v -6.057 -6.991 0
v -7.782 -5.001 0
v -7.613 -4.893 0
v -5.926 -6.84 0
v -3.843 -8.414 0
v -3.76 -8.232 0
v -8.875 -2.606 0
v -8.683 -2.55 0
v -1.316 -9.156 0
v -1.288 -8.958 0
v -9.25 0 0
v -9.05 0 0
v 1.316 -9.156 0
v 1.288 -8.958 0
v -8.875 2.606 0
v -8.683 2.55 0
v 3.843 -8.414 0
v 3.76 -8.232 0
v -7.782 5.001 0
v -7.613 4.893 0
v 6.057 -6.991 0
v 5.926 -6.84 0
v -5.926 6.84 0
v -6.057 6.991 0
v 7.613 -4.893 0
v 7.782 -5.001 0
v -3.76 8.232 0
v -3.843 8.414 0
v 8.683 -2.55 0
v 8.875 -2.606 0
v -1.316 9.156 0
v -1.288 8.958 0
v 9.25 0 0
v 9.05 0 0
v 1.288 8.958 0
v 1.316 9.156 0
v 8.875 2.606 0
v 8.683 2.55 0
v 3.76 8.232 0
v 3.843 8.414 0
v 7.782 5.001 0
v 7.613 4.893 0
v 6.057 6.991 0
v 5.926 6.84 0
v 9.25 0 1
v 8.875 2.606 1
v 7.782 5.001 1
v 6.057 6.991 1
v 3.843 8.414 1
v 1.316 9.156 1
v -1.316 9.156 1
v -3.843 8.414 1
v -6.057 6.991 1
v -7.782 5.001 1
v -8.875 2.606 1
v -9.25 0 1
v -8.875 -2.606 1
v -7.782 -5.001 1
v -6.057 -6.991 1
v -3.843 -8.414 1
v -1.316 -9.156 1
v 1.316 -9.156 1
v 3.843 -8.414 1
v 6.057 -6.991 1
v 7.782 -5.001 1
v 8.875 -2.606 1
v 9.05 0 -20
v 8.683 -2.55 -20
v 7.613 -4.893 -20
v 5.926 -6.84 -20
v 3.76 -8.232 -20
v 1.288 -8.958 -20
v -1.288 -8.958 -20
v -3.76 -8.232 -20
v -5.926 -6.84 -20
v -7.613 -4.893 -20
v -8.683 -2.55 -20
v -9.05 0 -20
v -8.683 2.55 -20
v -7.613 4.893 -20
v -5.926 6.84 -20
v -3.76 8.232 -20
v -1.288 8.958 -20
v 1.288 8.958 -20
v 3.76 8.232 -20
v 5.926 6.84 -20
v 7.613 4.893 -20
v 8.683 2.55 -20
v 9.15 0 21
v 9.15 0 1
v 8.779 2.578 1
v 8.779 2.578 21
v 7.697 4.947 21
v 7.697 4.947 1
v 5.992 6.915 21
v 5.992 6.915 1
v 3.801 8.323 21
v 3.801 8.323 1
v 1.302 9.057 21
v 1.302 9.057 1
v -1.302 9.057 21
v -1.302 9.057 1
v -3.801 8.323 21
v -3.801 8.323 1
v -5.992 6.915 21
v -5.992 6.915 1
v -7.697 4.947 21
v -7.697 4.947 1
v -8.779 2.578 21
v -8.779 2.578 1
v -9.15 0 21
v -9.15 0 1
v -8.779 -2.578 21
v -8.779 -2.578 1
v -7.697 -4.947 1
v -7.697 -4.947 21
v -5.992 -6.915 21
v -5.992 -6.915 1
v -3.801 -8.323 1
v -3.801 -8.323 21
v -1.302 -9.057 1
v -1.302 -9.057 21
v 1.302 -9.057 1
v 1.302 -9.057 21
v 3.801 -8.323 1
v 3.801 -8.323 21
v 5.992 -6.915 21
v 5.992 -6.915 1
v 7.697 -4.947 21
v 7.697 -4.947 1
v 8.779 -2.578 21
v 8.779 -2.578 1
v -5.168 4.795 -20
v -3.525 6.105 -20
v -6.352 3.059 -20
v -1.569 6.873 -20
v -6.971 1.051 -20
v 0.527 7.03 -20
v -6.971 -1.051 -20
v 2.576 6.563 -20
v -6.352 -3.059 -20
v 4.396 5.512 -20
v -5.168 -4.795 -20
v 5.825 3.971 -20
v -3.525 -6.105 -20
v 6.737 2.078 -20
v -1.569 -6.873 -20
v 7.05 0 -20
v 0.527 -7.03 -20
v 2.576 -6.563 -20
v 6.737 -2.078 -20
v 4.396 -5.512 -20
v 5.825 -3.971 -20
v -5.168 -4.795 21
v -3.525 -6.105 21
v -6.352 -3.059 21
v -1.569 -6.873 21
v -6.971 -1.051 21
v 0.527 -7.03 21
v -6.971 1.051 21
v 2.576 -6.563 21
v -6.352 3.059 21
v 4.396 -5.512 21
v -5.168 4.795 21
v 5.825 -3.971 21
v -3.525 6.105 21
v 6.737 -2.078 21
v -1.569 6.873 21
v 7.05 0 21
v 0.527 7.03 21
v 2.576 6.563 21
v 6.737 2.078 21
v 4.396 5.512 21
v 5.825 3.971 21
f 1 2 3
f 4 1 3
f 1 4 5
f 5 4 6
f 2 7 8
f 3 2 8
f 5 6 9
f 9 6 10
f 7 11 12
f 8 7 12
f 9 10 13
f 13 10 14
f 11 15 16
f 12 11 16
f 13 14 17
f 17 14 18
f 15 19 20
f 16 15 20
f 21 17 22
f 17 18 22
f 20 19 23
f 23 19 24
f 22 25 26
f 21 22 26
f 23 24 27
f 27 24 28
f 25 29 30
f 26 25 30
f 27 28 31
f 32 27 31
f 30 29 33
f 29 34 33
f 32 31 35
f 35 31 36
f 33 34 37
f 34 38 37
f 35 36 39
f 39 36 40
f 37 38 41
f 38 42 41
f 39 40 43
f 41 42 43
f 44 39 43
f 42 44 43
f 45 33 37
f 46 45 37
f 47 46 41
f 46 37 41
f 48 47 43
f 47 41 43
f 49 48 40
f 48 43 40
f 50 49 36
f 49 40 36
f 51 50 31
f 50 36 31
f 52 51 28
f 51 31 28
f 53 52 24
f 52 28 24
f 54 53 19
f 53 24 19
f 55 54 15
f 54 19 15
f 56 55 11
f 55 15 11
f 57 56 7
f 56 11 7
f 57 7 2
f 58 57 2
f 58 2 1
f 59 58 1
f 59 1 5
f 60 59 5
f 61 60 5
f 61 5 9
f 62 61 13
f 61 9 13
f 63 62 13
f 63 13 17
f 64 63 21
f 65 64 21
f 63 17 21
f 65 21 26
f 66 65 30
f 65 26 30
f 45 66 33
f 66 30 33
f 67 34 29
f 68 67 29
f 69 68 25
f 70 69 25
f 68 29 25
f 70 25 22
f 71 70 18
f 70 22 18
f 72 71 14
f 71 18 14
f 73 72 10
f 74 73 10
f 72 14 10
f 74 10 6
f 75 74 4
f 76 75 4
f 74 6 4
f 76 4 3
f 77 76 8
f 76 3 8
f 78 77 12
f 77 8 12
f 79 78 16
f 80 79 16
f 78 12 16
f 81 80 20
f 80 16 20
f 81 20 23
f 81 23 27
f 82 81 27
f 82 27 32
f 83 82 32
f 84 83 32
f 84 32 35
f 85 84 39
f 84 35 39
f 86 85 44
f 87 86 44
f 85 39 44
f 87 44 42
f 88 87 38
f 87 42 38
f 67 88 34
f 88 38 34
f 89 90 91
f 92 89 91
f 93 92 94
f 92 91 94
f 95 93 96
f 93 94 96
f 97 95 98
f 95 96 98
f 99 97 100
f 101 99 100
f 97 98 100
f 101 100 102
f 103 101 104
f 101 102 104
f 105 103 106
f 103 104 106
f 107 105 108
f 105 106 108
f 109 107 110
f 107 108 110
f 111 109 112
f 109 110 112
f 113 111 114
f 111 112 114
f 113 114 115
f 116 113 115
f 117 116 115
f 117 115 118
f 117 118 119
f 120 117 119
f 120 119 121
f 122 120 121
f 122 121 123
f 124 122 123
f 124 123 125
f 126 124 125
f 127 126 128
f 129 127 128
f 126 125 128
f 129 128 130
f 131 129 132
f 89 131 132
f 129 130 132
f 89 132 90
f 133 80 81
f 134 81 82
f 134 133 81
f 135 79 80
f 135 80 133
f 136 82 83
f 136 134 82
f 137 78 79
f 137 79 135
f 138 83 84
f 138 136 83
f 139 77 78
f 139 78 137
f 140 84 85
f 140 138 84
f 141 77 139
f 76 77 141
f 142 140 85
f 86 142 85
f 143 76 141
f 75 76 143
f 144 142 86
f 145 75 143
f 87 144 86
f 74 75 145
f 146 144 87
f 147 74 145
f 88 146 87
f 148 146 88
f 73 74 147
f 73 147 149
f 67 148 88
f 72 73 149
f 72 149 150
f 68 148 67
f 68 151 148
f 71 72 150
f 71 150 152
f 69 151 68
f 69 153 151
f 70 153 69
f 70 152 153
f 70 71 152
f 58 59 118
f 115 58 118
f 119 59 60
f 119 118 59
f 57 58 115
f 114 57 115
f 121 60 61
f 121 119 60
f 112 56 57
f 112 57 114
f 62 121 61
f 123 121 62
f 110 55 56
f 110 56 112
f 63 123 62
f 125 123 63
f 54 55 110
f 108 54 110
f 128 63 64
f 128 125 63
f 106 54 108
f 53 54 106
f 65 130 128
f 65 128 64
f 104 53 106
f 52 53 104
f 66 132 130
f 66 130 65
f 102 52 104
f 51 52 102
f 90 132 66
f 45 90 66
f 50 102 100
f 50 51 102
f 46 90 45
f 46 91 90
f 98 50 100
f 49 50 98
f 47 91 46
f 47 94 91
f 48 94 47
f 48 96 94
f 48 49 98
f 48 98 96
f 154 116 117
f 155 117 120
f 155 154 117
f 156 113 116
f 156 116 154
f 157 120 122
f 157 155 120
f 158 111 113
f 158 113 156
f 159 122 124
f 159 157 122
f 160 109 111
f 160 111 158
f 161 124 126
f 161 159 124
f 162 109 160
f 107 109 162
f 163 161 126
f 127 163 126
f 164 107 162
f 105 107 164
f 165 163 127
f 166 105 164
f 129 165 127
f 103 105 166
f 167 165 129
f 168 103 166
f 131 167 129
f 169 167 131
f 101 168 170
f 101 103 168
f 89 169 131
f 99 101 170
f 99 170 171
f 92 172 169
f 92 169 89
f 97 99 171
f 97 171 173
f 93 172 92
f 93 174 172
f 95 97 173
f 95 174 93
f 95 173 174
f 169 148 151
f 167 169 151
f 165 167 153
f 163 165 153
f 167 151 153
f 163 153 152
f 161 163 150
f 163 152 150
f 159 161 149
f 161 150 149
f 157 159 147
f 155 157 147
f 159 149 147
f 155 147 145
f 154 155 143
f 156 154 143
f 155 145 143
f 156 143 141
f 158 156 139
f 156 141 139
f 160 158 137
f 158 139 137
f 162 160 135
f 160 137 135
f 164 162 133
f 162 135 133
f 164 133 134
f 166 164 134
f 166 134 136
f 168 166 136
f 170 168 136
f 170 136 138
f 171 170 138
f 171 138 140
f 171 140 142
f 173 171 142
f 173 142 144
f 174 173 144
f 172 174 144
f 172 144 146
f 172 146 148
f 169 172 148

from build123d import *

# Parameters (mm, degrees)
F0_R     = 9.25
F1_DEPTH = 1
F2_R     = 9.15
F3_DEPTH = 20
F4_R     = 9.05
F5_DEPTH = 20
F6_R     = 7.05
F7_DEPTH = 41.001


with BuildPart() as f1:
    # F0 (on Top) → F1 (new body)
    with BuildSketch(Plane.XY):
        Circle(F0_R)
    extrude(amount=F1_DEPTH)

    # F2 (on face) → F3 (join)
    with BuildSketch(Plane.XY.offset(1)):
        Circle(F2_R)
    extrude(amount=F3_DEPTH)

    # F4 (on face) → F5 (join)
    with BuildSketch(Plane(origin=(0, 0, 0), x_dir=(1, 0, 0), z_dir=(0, 0, -1))):
        Circle(F4_R)
    extrude(amount=F5_DEPTH)

    # F6 (on face) → F7 (cut, through all)
    with BuildSketch(Plane(origin=(0, 0, -20), x_dir=(1, 0, 0), z_dir=(0, 0, -1))):
        Circle(F6_R)
    extrude(amount=-F7_DEPTH, mode=Mode.SUBTRACT)


solid = f1.part
